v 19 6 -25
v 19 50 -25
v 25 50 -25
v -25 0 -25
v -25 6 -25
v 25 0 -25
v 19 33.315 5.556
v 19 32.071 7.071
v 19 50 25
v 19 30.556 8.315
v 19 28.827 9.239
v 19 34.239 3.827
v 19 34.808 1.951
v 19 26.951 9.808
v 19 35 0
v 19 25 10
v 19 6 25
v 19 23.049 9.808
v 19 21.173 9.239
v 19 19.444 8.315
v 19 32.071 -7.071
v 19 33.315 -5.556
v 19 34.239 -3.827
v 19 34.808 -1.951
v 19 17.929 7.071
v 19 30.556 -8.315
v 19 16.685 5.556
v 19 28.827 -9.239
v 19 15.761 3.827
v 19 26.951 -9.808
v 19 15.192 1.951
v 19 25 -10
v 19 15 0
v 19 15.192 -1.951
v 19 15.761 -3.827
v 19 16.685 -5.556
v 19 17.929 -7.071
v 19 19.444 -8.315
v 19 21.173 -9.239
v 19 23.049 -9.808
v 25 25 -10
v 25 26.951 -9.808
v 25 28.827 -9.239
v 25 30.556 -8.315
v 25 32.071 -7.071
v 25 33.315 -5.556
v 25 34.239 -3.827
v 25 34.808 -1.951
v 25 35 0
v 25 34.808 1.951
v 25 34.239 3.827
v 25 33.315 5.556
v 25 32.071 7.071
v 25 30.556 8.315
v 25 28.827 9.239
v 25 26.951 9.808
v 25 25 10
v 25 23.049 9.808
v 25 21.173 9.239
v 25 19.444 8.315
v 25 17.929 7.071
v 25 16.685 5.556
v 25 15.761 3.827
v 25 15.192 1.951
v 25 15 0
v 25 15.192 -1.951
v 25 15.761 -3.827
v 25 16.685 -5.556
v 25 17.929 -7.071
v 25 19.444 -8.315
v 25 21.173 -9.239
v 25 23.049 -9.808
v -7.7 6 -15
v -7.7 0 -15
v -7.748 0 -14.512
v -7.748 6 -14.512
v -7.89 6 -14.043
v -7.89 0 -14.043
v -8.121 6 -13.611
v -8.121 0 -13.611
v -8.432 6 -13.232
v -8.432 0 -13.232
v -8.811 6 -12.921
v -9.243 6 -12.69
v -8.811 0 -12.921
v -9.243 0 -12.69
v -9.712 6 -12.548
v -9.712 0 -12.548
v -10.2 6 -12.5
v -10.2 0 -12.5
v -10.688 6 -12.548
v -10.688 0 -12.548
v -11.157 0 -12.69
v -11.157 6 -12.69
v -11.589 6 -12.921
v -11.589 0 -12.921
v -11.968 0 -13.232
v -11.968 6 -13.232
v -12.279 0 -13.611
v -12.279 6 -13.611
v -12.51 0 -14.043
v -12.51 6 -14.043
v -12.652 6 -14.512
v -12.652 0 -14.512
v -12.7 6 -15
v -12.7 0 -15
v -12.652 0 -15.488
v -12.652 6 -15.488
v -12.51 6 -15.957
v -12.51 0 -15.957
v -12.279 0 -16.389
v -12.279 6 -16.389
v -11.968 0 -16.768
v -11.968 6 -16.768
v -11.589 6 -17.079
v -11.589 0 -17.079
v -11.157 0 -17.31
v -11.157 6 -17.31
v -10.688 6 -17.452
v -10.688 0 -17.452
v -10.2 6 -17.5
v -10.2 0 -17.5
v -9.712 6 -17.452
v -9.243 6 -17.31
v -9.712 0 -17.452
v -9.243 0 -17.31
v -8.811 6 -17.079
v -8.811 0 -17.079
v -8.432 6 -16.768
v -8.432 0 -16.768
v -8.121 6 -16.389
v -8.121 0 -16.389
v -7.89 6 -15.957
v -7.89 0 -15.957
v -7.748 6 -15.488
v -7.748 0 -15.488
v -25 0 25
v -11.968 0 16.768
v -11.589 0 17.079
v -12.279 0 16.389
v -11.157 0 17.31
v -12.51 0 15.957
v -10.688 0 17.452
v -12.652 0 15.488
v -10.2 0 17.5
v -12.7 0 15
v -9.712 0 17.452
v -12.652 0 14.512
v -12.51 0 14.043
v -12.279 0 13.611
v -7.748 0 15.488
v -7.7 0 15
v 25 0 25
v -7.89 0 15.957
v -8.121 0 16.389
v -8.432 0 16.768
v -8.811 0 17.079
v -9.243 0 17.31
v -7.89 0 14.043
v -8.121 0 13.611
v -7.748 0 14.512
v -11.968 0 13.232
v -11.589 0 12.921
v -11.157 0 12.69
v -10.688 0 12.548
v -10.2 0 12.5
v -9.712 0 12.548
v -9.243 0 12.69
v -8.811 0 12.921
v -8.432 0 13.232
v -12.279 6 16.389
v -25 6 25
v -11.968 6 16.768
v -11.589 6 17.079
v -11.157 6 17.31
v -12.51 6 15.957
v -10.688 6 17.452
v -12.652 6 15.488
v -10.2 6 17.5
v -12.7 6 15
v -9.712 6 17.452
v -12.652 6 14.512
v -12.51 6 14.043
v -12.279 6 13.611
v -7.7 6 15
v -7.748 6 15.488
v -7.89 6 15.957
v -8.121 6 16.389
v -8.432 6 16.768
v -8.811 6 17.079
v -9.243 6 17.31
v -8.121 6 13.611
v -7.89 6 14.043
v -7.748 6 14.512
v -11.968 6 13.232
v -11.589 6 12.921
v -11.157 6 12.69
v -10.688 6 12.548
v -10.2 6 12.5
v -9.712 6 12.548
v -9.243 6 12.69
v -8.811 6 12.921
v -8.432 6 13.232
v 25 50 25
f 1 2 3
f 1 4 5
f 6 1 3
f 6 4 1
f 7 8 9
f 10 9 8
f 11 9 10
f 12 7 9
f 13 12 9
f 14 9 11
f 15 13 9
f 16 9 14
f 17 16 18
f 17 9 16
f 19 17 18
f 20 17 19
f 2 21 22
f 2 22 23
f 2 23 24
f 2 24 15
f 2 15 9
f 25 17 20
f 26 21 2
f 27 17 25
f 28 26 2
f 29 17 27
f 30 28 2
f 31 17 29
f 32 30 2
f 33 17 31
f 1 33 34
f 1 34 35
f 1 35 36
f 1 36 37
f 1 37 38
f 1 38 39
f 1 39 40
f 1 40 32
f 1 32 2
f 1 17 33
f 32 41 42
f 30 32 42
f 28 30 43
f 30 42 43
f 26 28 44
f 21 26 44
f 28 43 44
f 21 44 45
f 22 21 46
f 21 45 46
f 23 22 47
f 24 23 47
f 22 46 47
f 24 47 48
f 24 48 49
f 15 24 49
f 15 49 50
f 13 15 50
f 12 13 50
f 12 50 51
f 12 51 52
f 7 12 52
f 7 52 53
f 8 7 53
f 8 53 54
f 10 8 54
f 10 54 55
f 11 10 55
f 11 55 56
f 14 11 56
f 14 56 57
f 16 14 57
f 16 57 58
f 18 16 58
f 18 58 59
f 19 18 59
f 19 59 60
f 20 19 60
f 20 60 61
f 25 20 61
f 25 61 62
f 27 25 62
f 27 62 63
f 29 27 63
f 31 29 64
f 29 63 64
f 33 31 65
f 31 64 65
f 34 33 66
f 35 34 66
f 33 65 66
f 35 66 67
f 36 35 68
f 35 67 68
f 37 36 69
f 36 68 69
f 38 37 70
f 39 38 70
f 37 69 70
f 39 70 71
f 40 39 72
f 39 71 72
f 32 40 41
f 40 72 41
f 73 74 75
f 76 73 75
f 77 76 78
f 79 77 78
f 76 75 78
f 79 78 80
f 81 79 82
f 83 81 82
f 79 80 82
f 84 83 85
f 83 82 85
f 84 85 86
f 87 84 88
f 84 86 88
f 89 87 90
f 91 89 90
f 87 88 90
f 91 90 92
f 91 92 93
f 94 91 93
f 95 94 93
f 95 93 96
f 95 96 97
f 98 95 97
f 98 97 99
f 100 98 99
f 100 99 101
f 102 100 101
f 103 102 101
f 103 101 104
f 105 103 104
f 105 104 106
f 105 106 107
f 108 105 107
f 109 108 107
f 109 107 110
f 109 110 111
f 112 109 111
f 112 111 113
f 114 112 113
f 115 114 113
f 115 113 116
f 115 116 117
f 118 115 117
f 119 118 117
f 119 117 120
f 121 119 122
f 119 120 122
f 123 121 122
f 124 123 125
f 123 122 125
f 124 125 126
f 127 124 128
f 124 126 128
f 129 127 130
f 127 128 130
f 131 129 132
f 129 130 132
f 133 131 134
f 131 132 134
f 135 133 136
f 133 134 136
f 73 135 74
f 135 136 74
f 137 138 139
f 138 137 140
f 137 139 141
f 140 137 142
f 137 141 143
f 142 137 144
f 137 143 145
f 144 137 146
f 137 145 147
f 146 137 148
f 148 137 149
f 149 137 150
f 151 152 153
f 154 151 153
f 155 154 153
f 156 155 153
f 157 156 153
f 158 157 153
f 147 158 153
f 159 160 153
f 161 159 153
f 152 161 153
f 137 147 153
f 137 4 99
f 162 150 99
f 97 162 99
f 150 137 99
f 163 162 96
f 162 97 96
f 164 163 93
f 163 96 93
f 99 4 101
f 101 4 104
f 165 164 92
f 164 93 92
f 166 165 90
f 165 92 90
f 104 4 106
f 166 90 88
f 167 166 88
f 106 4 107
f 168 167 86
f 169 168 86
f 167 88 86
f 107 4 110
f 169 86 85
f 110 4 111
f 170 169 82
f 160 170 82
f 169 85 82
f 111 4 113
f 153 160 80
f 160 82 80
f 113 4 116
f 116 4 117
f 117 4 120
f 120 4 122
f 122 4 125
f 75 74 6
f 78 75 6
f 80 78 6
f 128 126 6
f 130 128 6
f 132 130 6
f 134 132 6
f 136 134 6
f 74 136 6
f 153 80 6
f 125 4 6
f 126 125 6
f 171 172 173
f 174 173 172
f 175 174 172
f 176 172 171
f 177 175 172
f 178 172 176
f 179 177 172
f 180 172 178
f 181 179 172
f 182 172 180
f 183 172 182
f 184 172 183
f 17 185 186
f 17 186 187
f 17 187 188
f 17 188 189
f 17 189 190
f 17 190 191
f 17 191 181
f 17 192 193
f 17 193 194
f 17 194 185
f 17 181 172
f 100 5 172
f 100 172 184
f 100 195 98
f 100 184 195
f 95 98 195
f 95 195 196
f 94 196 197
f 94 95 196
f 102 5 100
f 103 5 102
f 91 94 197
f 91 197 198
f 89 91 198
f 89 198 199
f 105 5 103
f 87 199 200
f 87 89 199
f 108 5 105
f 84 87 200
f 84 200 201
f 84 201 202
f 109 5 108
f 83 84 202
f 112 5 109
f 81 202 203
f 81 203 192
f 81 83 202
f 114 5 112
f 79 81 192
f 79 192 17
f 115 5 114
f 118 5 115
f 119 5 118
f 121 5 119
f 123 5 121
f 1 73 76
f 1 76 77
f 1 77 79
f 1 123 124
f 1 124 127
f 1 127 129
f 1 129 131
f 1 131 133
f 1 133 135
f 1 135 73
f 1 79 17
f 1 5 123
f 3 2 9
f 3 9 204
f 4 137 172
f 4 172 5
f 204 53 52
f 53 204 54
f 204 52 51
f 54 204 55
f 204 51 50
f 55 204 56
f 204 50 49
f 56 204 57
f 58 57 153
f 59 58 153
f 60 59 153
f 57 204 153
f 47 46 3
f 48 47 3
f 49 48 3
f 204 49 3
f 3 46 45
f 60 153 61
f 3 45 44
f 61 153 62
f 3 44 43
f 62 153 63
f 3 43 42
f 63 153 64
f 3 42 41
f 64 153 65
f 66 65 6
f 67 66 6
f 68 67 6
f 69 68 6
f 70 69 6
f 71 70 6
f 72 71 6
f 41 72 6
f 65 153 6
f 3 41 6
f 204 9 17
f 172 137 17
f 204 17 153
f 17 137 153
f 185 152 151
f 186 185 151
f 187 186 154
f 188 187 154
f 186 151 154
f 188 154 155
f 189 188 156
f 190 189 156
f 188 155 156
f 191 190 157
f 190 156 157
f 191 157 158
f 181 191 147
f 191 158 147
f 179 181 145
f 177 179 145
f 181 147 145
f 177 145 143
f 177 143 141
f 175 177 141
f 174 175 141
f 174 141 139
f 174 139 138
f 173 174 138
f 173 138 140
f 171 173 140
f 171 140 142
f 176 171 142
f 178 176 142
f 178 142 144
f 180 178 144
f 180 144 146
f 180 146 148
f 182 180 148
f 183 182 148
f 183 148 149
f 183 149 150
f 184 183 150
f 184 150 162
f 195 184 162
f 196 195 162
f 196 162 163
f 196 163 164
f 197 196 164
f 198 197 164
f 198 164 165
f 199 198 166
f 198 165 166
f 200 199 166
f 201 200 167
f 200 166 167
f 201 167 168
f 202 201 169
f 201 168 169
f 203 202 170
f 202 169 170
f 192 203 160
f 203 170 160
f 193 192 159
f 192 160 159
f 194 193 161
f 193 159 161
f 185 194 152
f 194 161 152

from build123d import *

# Parameters (mm, degrees)
SKETCH_1_W          = 50
SKETCH_1_H          = 50
EXTRUDE_1_DEPTH     = 6
SKETCH_2_W          = 6
SKETCH_2_H          = 50
EXTRUDE_2_DEPTH     = 44
SKETCH_3_R          = 10
CUT_EXTRUDE_1_DEPTH = 44
SKETCH_4_R          = 2.5
CUT_EXTRUDE_2_DEPTH = 44


with BuildPart() as part:
    # ｽｹｯﾁ1 → ﾎﾞｽ - 押し出し1 (new body)
    with BuildSketch(Plane(origin=(0, 0, 0), x_dir=(1, 0, 0), z_dir=(0, 1, 0))):
        Rectangle(SKETCH_1_W, SKETCH_1_H)
    extrude(amount=EXTRUDE_1_DEPTH)

    # ｽｹｯﾁ2 → ﾎﾞｽ - 押し出し2 (add)
    with BuildSketch(Plane(origin=(0, 6, 0), x_dir=(1, 0, 0), z_dir=(0, 1, 0))):
        with Locations((22, 0)):
            Rectangle(SKETCH_2_W, SKETCH_2_H)
    extrude(amount=EXTRUDE_2_DEPTH)

    # ｽｹｯﾁ3 → ｶｯﾄ - 押し出し1 (cut)
    with BuildSketch(Plane(origin=(25, 0, 0), x_dir=(0, 0, -1), z_dir=(1, 0, 0))):
        with Locations((0, 25)):
            Circle(SKETCH_3_R)
    extrude(amount=-CUT_EXTRUDE_1_DEPTH, mode=Mode.SUBTRACT)

    # ｽｹｯﾁ4 → ｶｯﾄ - 押し出し2 (cut)
    with BuildSketch(Plane.XZ):
        with Locations((-10.2, -15)):
            Circle(SKETCH_4_R)
        with Locations((-10.2, 15)):
            Circle(SKETCH_4_R)
    extrude(amount=-CUT_EXTRUDE_2_DEPTH, mode=Mode.SUBTRACT)


solid = part.part
